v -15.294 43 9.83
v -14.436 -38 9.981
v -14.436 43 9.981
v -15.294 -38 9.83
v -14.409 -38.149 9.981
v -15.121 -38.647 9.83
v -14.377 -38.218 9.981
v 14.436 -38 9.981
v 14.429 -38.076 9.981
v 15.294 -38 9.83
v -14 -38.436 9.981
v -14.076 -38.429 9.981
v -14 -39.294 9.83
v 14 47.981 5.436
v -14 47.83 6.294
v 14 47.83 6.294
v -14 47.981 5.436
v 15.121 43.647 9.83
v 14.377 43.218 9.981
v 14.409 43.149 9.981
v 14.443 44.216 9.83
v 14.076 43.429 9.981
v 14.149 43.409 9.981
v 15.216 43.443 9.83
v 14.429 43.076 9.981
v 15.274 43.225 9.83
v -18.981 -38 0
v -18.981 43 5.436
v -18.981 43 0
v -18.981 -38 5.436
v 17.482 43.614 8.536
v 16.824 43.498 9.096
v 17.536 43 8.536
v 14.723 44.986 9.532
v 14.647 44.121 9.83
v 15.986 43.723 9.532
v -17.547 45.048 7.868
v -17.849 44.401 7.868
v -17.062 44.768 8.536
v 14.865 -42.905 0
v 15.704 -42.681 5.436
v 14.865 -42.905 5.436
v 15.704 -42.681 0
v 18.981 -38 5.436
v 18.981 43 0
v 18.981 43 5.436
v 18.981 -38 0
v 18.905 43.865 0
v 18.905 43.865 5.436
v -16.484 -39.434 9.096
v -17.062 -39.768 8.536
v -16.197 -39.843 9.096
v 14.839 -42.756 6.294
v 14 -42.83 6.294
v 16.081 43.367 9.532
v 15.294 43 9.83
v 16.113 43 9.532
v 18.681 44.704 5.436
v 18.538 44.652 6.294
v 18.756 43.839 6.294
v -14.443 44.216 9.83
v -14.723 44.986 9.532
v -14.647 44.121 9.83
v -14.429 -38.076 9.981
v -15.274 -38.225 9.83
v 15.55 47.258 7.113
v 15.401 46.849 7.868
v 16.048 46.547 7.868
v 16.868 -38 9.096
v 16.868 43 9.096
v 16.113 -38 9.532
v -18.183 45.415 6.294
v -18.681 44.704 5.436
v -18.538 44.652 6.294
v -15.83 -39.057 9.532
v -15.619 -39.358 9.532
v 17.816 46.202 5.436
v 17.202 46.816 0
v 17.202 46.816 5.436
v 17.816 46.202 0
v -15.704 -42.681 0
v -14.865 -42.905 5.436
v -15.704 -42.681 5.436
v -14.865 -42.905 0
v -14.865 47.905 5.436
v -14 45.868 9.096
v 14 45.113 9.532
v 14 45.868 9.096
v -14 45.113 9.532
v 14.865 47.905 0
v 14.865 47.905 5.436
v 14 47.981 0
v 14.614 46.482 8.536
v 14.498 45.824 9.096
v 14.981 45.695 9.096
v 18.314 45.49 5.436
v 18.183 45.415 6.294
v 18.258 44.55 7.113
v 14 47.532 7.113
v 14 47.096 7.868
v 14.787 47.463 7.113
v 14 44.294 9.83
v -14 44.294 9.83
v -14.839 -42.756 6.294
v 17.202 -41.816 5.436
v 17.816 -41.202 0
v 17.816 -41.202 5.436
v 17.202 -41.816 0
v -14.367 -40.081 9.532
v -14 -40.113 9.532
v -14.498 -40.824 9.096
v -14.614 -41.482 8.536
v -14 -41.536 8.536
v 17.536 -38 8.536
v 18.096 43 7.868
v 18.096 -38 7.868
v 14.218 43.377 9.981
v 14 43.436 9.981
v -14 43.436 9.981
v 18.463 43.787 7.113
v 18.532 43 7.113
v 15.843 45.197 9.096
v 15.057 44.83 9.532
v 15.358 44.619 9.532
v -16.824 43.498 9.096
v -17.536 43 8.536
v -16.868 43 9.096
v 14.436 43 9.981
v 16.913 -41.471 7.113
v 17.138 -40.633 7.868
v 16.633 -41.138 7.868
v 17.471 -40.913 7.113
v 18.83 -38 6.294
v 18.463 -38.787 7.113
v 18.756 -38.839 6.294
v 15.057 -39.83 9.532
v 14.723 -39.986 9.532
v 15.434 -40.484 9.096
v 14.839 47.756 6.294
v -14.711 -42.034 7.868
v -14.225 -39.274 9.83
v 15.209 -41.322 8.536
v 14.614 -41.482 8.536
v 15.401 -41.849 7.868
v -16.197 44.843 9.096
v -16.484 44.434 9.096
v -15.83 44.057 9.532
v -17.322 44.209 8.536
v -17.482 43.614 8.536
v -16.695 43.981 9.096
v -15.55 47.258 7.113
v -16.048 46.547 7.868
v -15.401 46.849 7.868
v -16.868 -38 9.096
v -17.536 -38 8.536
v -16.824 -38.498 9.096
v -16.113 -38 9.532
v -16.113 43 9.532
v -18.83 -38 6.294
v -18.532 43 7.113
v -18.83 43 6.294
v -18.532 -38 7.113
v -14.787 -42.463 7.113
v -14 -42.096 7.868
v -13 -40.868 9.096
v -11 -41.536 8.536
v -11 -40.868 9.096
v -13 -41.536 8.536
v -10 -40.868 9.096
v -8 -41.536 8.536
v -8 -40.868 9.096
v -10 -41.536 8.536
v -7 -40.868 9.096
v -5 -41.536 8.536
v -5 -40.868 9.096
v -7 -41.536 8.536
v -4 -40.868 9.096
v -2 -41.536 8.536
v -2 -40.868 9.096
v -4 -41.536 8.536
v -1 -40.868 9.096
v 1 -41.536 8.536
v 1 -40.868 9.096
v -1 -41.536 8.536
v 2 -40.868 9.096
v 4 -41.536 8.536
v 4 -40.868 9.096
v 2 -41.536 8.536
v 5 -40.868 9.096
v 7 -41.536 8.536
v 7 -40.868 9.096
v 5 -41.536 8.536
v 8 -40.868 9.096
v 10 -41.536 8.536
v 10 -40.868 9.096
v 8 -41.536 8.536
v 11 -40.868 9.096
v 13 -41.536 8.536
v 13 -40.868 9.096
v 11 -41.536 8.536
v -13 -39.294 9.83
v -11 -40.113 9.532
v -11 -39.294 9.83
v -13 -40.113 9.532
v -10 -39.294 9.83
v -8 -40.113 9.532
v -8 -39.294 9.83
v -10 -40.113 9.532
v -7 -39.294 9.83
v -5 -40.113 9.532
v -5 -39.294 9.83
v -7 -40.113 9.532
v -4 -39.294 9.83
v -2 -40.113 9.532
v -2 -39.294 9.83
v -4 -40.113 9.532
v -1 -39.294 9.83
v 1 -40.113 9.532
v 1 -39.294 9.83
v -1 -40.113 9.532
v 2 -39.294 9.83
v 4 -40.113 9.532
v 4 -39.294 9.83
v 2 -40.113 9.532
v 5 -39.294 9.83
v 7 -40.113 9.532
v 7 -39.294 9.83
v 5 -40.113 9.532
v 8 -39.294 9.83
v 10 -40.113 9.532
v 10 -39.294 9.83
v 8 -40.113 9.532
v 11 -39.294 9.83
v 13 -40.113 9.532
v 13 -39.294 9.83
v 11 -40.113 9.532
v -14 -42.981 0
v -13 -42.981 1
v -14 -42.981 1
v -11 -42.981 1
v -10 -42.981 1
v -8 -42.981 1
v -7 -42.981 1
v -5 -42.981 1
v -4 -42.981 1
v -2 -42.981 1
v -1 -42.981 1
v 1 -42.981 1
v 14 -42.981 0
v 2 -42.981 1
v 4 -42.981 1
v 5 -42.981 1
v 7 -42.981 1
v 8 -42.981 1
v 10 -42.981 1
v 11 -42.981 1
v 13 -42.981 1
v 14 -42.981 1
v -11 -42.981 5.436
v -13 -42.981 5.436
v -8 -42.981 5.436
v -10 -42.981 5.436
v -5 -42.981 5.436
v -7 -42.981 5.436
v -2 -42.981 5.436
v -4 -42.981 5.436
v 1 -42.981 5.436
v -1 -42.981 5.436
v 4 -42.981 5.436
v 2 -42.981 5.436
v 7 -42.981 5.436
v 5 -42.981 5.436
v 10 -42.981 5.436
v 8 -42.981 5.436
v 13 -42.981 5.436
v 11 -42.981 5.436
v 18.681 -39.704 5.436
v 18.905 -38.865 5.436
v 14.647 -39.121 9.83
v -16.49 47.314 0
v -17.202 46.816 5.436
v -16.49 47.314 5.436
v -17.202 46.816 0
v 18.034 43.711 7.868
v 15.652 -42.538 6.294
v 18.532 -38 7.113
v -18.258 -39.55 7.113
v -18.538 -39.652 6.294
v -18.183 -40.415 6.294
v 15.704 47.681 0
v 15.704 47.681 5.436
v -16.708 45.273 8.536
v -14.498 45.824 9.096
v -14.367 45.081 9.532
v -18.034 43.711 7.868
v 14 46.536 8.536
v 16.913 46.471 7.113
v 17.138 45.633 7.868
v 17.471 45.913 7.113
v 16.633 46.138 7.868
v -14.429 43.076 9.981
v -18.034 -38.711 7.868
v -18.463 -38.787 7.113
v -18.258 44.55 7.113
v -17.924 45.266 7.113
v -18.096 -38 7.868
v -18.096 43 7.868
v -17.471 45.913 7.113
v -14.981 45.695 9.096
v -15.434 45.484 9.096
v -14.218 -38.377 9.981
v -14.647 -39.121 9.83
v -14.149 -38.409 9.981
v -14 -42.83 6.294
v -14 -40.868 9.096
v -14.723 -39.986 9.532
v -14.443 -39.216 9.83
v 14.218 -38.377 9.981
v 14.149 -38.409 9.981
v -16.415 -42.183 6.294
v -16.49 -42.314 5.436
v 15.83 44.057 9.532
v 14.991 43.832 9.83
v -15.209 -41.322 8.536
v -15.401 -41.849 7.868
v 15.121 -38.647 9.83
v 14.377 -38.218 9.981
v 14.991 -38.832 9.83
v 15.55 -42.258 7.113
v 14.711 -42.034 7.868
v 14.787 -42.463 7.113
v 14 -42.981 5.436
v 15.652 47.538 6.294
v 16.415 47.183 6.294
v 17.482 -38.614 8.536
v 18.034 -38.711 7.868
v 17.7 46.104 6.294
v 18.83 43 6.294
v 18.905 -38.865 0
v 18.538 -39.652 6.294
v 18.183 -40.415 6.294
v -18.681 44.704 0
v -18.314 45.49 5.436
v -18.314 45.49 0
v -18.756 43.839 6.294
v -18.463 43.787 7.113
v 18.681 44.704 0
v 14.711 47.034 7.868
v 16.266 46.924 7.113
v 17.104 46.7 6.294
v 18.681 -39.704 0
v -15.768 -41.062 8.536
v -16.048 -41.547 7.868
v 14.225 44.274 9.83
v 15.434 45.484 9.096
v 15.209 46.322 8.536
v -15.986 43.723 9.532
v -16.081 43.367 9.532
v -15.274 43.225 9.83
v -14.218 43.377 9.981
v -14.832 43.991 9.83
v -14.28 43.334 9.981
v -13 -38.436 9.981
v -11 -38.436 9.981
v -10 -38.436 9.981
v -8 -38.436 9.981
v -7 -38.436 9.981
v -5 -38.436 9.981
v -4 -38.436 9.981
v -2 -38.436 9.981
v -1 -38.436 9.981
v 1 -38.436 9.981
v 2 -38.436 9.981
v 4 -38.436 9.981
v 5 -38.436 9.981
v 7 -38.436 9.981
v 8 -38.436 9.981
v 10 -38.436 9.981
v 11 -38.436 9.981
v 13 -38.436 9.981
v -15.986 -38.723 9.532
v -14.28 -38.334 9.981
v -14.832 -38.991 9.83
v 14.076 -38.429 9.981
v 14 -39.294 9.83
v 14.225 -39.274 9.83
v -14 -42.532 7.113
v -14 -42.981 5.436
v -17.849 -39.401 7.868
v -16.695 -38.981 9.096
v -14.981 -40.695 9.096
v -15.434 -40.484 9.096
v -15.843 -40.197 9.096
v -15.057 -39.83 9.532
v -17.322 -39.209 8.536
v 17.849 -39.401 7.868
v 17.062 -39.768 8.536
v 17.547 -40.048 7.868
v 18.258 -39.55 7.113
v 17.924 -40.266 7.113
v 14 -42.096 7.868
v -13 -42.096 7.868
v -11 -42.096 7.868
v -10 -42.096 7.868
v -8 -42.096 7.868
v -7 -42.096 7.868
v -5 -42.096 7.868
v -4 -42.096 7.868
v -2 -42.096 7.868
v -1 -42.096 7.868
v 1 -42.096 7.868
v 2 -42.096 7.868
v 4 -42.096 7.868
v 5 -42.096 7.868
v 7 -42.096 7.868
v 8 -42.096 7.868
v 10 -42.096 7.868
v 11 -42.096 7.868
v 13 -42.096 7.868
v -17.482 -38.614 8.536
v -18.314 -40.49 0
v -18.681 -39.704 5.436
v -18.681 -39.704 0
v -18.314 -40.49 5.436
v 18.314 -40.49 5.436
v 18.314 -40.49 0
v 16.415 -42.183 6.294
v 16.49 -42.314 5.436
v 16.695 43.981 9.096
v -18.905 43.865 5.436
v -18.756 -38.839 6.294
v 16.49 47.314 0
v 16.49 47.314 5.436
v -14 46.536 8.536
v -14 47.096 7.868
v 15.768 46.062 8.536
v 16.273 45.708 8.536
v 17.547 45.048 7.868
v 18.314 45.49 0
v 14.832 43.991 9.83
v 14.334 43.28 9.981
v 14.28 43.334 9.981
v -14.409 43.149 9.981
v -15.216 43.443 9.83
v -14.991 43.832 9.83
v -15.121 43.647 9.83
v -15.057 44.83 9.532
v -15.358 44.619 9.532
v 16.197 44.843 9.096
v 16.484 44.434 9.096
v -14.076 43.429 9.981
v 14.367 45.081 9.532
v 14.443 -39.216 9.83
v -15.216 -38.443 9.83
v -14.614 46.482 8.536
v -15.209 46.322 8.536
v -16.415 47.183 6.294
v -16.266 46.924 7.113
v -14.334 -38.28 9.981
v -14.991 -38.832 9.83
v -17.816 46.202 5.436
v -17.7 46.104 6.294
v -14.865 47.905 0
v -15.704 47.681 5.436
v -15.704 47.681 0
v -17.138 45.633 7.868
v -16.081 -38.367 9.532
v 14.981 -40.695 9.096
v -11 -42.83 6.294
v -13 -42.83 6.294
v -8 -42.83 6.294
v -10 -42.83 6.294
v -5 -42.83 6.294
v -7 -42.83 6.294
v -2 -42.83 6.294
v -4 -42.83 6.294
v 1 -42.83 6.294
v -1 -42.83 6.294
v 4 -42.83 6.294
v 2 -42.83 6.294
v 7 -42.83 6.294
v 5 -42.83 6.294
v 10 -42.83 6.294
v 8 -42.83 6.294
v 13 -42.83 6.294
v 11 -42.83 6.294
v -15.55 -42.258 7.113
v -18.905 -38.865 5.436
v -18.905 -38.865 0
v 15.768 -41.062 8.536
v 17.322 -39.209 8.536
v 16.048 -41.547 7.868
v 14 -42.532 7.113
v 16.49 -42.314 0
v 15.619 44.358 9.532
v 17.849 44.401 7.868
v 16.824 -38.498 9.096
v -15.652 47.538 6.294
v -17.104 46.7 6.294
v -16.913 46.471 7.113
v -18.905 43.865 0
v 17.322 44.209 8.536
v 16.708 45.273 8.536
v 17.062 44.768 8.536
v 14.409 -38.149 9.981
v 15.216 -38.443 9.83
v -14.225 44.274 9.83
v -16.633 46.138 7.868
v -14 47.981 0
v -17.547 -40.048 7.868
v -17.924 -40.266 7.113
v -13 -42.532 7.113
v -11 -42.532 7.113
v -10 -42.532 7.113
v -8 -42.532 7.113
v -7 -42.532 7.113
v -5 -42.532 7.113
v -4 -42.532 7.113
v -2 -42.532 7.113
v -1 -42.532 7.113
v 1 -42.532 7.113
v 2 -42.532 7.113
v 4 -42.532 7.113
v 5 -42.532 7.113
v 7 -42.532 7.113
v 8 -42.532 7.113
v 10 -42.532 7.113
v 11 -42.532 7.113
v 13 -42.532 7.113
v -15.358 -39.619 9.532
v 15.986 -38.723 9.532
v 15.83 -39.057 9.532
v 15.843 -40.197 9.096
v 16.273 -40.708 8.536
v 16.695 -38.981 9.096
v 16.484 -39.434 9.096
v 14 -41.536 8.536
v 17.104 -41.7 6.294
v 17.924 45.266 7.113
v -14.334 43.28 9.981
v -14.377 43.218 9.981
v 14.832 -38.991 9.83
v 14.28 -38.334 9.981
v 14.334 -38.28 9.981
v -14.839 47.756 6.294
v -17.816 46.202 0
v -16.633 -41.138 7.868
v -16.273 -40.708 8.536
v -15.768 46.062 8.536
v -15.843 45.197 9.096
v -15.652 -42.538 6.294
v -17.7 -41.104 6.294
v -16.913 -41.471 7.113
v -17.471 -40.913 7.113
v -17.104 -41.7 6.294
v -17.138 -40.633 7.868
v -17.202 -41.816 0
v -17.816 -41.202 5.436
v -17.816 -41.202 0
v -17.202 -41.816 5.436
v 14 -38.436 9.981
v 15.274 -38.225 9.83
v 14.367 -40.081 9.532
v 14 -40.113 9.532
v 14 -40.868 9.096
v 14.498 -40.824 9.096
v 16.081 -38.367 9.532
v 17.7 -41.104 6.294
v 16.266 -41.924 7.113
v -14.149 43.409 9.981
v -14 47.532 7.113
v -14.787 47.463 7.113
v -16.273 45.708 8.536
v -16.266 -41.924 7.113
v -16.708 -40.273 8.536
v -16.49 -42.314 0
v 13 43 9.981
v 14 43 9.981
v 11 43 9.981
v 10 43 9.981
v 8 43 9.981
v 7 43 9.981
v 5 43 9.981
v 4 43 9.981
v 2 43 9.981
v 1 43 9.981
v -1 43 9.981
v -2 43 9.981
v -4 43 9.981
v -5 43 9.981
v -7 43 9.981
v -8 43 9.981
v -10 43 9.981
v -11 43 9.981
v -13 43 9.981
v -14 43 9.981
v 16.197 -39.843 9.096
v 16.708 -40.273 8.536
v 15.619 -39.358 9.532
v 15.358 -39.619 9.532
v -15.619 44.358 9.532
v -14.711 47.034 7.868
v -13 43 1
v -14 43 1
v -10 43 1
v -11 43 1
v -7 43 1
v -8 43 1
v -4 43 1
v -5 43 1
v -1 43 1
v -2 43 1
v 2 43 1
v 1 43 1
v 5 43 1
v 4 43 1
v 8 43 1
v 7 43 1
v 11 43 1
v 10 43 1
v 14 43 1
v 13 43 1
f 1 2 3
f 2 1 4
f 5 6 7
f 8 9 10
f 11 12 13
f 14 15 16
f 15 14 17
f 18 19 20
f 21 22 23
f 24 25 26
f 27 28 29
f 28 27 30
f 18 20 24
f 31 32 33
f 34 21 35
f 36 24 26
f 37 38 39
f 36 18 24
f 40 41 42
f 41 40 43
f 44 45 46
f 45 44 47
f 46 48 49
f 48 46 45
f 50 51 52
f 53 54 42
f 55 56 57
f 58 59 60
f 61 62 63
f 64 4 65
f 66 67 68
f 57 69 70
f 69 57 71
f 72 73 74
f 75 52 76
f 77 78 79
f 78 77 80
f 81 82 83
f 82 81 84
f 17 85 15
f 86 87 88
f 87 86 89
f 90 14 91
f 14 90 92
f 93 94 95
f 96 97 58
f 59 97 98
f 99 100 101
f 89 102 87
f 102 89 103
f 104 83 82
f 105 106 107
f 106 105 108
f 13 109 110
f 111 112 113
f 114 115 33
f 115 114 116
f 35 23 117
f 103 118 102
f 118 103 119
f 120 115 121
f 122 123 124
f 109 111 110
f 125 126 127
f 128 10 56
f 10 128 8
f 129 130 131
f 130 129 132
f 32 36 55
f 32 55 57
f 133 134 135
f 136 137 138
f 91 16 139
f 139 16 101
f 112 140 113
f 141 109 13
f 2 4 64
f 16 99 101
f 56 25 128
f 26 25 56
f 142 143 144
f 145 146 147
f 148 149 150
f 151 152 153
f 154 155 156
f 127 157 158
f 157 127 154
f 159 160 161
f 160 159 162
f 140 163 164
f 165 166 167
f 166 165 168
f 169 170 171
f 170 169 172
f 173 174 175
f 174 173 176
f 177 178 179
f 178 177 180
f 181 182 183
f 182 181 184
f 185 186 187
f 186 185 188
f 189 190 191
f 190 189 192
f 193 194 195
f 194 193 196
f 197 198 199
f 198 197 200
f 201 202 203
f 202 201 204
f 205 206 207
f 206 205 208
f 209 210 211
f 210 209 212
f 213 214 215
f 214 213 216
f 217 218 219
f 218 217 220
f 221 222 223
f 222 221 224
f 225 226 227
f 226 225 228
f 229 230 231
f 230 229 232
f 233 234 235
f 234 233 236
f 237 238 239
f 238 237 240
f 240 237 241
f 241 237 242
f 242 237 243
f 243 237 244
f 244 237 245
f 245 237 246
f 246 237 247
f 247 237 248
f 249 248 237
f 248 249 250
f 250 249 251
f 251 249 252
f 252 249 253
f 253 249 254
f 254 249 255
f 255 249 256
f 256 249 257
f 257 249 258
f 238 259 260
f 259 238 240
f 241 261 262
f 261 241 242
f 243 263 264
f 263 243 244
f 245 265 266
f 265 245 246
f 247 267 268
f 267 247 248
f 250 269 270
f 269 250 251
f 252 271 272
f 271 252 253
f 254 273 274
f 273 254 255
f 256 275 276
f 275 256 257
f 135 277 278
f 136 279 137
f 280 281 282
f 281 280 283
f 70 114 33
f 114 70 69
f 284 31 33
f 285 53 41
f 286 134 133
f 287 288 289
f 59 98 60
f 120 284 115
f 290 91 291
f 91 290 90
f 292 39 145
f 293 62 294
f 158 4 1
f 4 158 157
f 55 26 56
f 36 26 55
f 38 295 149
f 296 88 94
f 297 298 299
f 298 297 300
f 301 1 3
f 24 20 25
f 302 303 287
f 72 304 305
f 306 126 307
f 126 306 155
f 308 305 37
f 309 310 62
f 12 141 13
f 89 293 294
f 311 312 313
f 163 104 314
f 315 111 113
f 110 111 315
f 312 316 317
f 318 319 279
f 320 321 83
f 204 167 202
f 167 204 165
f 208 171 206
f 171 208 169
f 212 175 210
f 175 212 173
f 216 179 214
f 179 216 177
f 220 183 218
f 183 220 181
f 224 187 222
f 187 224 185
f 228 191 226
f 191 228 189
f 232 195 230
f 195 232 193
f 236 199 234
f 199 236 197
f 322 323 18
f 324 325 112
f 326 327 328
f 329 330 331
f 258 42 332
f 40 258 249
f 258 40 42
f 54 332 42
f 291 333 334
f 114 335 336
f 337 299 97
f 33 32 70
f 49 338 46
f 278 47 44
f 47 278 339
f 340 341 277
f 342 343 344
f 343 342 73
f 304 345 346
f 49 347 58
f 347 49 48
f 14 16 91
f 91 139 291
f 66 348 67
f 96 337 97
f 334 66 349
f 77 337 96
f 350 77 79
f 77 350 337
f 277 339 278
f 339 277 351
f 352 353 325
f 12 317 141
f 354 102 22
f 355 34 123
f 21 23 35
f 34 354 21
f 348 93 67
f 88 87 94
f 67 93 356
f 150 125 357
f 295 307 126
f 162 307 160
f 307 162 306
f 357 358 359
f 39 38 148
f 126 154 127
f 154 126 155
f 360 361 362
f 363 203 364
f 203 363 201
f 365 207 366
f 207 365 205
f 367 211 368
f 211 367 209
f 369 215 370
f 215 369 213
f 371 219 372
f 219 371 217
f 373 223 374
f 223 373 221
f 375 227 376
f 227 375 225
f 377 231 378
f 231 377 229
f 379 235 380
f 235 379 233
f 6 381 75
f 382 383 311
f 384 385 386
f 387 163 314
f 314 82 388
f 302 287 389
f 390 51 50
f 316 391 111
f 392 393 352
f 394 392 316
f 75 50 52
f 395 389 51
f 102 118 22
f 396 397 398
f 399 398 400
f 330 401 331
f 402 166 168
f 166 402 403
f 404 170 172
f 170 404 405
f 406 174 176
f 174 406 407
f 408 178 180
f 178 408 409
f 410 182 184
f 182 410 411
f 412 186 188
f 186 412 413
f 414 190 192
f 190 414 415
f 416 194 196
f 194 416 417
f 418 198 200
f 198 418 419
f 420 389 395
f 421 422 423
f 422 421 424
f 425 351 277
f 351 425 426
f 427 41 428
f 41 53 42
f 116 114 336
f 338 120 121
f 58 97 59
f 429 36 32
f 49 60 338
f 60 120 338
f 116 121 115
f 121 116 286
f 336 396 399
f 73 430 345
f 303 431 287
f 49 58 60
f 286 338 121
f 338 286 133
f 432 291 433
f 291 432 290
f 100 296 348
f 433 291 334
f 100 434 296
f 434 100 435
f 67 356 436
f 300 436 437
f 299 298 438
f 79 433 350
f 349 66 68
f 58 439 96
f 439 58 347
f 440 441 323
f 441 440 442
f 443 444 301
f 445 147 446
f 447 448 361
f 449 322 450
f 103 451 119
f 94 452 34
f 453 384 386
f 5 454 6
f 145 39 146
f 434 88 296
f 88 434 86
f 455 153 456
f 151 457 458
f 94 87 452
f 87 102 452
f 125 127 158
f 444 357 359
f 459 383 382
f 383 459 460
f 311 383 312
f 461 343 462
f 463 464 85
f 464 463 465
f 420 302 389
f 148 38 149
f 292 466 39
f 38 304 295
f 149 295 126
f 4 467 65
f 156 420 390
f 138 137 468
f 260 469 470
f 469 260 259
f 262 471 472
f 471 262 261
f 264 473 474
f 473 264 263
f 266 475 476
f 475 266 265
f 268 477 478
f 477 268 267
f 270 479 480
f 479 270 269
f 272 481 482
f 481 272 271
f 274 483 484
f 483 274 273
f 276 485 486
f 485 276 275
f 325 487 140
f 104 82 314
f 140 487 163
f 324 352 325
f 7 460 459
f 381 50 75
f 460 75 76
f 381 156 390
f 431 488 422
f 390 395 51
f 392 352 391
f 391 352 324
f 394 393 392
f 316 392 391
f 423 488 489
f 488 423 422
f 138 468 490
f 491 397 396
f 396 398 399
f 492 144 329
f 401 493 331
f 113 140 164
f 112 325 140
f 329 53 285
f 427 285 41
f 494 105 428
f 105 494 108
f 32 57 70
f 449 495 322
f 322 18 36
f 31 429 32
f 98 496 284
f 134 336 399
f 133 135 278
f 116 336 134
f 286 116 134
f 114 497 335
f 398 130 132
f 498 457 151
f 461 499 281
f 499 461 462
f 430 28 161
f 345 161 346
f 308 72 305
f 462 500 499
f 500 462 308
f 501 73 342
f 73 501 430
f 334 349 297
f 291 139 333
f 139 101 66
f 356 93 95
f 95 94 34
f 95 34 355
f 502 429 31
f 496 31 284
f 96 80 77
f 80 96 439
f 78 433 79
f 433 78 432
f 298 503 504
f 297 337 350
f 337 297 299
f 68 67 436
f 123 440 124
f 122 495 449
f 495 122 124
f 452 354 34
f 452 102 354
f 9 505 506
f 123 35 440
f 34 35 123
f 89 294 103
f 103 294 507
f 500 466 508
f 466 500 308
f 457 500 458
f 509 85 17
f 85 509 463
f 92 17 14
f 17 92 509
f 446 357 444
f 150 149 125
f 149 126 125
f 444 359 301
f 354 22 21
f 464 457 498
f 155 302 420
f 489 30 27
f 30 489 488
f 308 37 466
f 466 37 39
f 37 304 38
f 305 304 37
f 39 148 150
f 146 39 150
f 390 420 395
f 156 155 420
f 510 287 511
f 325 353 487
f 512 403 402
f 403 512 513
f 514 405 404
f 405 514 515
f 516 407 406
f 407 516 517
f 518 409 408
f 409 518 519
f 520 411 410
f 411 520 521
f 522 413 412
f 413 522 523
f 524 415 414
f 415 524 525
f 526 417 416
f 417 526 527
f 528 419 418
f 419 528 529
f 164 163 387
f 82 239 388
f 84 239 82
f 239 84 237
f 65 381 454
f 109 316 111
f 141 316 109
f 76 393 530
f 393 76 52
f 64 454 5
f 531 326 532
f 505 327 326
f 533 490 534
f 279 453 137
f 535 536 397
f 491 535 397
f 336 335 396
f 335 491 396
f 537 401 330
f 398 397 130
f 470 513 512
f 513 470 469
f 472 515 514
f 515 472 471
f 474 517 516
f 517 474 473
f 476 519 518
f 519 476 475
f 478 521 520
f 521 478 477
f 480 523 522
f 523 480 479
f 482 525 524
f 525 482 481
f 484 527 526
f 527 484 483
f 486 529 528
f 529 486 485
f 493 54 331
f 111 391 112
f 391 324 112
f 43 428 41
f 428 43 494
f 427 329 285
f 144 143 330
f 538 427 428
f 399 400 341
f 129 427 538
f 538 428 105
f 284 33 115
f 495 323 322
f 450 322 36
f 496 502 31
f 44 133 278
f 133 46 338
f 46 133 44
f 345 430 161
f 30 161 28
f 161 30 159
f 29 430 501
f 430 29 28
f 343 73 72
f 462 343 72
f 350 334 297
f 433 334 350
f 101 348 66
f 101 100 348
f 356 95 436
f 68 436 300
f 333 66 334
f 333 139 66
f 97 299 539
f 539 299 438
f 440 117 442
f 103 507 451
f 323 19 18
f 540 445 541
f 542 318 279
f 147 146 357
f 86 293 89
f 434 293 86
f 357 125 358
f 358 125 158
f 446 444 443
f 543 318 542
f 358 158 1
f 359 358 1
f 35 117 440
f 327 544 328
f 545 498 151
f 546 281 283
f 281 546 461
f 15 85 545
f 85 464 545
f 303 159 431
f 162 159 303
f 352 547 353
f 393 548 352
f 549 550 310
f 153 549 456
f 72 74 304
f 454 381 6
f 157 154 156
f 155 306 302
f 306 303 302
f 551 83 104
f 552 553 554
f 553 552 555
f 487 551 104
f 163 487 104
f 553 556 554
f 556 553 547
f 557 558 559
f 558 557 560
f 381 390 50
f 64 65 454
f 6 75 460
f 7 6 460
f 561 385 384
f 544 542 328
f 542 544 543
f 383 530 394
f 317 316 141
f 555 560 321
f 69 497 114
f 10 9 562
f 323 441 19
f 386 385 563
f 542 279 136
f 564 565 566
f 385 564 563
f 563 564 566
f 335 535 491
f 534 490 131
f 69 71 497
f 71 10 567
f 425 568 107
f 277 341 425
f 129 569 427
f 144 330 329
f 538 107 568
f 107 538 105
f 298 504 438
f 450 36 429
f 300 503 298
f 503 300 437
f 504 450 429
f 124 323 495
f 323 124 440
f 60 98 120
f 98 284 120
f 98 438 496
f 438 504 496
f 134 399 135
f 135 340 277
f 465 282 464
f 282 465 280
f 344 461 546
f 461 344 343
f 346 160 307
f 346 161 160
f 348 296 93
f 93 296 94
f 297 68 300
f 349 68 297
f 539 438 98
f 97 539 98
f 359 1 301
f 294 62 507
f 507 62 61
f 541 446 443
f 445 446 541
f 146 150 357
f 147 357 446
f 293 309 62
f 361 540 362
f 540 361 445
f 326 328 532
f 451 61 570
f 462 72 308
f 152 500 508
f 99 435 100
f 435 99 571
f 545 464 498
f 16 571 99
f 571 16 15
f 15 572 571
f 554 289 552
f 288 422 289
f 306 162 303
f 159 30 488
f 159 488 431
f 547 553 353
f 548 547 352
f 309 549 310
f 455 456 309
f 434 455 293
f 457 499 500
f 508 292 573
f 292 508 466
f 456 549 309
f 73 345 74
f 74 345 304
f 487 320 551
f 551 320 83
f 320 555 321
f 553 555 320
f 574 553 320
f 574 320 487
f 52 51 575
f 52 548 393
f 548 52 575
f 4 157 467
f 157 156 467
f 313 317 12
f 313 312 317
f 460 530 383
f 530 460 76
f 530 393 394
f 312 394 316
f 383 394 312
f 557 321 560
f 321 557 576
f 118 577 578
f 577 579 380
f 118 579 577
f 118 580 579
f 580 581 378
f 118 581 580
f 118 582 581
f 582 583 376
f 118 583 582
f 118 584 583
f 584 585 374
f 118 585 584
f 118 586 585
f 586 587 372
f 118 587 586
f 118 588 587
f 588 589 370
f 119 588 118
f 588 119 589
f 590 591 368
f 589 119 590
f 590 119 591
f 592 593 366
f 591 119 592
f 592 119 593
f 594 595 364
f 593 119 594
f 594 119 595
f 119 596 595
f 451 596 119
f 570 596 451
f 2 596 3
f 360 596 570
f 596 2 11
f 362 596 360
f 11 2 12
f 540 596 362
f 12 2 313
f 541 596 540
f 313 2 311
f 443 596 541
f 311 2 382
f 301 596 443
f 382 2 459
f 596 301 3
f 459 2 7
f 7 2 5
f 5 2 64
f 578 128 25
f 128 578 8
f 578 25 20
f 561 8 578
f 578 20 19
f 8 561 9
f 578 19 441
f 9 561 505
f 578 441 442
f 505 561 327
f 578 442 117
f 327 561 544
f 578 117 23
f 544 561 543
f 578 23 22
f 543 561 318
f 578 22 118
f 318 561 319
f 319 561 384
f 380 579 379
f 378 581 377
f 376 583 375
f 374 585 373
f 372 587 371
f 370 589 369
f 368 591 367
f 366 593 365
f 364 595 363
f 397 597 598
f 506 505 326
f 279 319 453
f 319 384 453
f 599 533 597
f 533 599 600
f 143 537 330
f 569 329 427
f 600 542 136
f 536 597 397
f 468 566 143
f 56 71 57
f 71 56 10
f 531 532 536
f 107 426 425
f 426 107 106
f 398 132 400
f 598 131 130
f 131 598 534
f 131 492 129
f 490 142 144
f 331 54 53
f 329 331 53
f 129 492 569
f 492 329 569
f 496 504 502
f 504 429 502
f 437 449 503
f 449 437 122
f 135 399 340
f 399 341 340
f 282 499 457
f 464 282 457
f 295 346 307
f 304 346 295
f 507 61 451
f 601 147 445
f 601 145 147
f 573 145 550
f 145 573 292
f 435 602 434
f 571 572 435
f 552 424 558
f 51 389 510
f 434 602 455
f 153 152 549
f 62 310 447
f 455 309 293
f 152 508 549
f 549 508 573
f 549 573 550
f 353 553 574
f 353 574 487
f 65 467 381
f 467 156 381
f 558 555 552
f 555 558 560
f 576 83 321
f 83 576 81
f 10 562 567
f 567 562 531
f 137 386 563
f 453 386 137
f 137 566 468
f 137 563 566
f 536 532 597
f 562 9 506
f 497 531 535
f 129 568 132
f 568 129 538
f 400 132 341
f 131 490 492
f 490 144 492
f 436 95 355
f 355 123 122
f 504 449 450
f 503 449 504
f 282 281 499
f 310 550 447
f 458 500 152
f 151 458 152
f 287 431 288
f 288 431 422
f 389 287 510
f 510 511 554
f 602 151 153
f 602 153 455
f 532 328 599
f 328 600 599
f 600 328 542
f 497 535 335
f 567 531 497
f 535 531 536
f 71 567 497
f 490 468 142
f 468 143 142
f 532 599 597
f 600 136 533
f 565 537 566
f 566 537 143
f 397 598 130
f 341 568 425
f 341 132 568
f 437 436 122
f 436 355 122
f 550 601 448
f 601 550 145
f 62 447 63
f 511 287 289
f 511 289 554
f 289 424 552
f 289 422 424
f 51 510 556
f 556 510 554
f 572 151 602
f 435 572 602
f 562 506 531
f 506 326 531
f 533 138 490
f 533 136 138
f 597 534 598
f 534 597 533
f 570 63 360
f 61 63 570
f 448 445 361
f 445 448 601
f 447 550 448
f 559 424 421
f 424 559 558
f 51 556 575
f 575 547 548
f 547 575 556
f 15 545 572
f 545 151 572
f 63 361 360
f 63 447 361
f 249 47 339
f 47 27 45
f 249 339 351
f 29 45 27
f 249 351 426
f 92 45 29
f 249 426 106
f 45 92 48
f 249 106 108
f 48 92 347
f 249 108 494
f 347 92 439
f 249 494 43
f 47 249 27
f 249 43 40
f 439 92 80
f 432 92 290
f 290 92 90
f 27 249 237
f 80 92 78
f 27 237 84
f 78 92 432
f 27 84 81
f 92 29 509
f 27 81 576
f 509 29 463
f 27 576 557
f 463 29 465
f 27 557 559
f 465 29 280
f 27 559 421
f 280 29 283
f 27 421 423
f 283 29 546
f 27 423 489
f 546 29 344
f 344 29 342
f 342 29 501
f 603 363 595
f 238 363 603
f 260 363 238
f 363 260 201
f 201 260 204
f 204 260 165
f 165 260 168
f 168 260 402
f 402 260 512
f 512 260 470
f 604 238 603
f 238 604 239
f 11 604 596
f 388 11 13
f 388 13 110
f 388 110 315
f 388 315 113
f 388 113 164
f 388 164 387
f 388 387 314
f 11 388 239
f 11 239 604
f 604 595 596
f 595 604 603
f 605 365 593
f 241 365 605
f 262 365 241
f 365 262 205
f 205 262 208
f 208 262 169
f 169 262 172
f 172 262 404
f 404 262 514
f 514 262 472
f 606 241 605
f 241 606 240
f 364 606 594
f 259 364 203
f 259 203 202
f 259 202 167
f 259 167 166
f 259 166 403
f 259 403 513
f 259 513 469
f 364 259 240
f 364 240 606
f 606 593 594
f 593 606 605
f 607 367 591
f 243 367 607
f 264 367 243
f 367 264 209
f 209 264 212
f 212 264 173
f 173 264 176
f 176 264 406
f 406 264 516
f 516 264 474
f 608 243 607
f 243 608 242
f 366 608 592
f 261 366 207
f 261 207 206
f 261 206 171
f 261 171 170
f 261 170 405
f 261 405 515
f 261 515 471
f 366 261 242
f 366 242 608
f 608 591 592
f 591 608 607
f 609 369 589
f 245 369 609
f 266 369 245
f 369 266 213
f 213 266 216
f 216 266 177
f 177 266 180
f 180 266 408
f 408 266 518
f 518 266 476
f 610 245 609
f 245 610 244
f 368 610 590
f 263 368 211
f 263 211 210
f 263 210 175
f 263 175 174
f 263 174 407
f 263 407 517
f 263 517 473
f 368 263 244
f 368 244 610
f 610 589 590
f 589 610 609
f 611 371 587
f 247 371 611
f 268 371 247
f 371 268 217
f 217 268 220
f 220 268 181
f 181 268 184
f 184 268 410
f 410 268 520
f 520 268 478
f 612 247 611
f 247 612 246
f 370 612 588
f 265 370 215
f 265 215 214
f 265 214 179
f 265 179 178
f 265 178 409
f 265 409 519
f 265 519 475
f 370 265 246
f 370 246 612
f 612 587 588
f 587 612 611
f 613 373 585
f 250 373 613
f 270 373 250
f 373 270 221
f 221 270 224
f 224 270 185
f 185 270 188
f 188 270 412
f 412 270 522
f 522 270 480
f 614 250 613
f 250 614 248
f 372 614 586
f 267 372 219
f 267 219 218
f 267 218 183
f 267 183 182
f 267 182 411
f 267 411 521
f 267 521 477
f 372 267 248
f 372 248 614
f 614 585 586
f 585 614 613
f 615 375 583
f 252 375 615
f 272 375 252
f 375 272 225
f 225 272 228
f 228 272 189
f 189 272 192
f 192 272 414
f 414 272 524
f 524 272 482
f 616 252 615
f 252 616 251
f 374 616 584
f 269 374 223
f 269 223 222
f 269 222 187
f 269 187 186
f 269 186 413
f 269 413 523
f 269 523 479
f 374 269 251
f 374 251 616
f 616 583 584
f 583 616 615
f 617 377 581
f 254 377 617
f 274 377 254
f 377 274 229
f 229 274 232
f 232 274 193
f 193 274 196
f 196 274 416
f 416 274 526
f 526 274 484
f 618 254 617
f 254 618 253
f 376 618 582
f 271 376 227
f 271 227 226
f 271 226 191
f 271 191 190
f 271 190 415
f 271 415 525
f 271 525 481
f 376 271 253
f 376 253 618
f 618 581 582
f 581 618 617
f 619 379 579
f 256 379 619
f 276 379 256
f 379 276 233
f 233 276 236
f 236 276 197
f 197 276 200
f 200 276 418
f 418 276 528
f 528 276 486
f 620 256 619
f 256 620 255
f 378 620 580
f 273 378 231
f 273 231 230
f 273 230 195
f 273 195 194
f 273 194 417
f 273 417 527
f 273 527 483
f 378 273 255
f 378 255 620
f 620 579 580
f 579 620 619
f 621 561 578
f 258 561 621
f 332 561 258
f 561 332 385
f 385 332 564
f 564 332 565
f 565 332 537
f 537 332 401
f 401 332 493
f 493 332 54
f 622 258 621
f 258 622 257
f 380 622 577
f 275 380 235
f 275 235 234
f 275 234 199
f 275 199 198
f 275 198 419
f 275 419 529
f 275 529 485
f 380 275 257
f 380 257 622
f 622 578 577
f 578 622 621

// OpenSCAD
card_dim = [1, 86, 55];

card_slot_count = 10;
card_slot_gap = 2;

card_slot_period = card_slot_gap + card_dim.x;

base_rounding = 5;
base_dim = [
    (card_slot_count - 1) * card_slot_period + card_dim.x,
    card_dim.y,
    10,
];


module card() {
    translate([0, 0, card_dim.z / 2])
    cube(card_dim, center = true);
}


module card_slots() {
    translate([- (card_slot_count - 1) * card_slot_period / 2, 0, 0])
    for(ix = [0 : card_slot_count - 1])
    translate([ix * card_slot_period, 0, 0])
    card();
}

module base() {
    intersection() {
        base_h = base_dim.z - base_rounding;
        minkowski() {
            translate([0, base_rounding / 2, base_h / 2])
            cube([base_dim.x, base_dim.y - base_rounding, base_h], center = true);

            sphere(base_rounding, $fn = 36);
        }

        translate([0, 0, base_dim.z / 2])
        cube(base_dim + [base_rounding, base_rounding, 0] * 2, center = true);
    }
}


difference() {
    base();
    translate([0, 0, 1])
    card_slots();
}
